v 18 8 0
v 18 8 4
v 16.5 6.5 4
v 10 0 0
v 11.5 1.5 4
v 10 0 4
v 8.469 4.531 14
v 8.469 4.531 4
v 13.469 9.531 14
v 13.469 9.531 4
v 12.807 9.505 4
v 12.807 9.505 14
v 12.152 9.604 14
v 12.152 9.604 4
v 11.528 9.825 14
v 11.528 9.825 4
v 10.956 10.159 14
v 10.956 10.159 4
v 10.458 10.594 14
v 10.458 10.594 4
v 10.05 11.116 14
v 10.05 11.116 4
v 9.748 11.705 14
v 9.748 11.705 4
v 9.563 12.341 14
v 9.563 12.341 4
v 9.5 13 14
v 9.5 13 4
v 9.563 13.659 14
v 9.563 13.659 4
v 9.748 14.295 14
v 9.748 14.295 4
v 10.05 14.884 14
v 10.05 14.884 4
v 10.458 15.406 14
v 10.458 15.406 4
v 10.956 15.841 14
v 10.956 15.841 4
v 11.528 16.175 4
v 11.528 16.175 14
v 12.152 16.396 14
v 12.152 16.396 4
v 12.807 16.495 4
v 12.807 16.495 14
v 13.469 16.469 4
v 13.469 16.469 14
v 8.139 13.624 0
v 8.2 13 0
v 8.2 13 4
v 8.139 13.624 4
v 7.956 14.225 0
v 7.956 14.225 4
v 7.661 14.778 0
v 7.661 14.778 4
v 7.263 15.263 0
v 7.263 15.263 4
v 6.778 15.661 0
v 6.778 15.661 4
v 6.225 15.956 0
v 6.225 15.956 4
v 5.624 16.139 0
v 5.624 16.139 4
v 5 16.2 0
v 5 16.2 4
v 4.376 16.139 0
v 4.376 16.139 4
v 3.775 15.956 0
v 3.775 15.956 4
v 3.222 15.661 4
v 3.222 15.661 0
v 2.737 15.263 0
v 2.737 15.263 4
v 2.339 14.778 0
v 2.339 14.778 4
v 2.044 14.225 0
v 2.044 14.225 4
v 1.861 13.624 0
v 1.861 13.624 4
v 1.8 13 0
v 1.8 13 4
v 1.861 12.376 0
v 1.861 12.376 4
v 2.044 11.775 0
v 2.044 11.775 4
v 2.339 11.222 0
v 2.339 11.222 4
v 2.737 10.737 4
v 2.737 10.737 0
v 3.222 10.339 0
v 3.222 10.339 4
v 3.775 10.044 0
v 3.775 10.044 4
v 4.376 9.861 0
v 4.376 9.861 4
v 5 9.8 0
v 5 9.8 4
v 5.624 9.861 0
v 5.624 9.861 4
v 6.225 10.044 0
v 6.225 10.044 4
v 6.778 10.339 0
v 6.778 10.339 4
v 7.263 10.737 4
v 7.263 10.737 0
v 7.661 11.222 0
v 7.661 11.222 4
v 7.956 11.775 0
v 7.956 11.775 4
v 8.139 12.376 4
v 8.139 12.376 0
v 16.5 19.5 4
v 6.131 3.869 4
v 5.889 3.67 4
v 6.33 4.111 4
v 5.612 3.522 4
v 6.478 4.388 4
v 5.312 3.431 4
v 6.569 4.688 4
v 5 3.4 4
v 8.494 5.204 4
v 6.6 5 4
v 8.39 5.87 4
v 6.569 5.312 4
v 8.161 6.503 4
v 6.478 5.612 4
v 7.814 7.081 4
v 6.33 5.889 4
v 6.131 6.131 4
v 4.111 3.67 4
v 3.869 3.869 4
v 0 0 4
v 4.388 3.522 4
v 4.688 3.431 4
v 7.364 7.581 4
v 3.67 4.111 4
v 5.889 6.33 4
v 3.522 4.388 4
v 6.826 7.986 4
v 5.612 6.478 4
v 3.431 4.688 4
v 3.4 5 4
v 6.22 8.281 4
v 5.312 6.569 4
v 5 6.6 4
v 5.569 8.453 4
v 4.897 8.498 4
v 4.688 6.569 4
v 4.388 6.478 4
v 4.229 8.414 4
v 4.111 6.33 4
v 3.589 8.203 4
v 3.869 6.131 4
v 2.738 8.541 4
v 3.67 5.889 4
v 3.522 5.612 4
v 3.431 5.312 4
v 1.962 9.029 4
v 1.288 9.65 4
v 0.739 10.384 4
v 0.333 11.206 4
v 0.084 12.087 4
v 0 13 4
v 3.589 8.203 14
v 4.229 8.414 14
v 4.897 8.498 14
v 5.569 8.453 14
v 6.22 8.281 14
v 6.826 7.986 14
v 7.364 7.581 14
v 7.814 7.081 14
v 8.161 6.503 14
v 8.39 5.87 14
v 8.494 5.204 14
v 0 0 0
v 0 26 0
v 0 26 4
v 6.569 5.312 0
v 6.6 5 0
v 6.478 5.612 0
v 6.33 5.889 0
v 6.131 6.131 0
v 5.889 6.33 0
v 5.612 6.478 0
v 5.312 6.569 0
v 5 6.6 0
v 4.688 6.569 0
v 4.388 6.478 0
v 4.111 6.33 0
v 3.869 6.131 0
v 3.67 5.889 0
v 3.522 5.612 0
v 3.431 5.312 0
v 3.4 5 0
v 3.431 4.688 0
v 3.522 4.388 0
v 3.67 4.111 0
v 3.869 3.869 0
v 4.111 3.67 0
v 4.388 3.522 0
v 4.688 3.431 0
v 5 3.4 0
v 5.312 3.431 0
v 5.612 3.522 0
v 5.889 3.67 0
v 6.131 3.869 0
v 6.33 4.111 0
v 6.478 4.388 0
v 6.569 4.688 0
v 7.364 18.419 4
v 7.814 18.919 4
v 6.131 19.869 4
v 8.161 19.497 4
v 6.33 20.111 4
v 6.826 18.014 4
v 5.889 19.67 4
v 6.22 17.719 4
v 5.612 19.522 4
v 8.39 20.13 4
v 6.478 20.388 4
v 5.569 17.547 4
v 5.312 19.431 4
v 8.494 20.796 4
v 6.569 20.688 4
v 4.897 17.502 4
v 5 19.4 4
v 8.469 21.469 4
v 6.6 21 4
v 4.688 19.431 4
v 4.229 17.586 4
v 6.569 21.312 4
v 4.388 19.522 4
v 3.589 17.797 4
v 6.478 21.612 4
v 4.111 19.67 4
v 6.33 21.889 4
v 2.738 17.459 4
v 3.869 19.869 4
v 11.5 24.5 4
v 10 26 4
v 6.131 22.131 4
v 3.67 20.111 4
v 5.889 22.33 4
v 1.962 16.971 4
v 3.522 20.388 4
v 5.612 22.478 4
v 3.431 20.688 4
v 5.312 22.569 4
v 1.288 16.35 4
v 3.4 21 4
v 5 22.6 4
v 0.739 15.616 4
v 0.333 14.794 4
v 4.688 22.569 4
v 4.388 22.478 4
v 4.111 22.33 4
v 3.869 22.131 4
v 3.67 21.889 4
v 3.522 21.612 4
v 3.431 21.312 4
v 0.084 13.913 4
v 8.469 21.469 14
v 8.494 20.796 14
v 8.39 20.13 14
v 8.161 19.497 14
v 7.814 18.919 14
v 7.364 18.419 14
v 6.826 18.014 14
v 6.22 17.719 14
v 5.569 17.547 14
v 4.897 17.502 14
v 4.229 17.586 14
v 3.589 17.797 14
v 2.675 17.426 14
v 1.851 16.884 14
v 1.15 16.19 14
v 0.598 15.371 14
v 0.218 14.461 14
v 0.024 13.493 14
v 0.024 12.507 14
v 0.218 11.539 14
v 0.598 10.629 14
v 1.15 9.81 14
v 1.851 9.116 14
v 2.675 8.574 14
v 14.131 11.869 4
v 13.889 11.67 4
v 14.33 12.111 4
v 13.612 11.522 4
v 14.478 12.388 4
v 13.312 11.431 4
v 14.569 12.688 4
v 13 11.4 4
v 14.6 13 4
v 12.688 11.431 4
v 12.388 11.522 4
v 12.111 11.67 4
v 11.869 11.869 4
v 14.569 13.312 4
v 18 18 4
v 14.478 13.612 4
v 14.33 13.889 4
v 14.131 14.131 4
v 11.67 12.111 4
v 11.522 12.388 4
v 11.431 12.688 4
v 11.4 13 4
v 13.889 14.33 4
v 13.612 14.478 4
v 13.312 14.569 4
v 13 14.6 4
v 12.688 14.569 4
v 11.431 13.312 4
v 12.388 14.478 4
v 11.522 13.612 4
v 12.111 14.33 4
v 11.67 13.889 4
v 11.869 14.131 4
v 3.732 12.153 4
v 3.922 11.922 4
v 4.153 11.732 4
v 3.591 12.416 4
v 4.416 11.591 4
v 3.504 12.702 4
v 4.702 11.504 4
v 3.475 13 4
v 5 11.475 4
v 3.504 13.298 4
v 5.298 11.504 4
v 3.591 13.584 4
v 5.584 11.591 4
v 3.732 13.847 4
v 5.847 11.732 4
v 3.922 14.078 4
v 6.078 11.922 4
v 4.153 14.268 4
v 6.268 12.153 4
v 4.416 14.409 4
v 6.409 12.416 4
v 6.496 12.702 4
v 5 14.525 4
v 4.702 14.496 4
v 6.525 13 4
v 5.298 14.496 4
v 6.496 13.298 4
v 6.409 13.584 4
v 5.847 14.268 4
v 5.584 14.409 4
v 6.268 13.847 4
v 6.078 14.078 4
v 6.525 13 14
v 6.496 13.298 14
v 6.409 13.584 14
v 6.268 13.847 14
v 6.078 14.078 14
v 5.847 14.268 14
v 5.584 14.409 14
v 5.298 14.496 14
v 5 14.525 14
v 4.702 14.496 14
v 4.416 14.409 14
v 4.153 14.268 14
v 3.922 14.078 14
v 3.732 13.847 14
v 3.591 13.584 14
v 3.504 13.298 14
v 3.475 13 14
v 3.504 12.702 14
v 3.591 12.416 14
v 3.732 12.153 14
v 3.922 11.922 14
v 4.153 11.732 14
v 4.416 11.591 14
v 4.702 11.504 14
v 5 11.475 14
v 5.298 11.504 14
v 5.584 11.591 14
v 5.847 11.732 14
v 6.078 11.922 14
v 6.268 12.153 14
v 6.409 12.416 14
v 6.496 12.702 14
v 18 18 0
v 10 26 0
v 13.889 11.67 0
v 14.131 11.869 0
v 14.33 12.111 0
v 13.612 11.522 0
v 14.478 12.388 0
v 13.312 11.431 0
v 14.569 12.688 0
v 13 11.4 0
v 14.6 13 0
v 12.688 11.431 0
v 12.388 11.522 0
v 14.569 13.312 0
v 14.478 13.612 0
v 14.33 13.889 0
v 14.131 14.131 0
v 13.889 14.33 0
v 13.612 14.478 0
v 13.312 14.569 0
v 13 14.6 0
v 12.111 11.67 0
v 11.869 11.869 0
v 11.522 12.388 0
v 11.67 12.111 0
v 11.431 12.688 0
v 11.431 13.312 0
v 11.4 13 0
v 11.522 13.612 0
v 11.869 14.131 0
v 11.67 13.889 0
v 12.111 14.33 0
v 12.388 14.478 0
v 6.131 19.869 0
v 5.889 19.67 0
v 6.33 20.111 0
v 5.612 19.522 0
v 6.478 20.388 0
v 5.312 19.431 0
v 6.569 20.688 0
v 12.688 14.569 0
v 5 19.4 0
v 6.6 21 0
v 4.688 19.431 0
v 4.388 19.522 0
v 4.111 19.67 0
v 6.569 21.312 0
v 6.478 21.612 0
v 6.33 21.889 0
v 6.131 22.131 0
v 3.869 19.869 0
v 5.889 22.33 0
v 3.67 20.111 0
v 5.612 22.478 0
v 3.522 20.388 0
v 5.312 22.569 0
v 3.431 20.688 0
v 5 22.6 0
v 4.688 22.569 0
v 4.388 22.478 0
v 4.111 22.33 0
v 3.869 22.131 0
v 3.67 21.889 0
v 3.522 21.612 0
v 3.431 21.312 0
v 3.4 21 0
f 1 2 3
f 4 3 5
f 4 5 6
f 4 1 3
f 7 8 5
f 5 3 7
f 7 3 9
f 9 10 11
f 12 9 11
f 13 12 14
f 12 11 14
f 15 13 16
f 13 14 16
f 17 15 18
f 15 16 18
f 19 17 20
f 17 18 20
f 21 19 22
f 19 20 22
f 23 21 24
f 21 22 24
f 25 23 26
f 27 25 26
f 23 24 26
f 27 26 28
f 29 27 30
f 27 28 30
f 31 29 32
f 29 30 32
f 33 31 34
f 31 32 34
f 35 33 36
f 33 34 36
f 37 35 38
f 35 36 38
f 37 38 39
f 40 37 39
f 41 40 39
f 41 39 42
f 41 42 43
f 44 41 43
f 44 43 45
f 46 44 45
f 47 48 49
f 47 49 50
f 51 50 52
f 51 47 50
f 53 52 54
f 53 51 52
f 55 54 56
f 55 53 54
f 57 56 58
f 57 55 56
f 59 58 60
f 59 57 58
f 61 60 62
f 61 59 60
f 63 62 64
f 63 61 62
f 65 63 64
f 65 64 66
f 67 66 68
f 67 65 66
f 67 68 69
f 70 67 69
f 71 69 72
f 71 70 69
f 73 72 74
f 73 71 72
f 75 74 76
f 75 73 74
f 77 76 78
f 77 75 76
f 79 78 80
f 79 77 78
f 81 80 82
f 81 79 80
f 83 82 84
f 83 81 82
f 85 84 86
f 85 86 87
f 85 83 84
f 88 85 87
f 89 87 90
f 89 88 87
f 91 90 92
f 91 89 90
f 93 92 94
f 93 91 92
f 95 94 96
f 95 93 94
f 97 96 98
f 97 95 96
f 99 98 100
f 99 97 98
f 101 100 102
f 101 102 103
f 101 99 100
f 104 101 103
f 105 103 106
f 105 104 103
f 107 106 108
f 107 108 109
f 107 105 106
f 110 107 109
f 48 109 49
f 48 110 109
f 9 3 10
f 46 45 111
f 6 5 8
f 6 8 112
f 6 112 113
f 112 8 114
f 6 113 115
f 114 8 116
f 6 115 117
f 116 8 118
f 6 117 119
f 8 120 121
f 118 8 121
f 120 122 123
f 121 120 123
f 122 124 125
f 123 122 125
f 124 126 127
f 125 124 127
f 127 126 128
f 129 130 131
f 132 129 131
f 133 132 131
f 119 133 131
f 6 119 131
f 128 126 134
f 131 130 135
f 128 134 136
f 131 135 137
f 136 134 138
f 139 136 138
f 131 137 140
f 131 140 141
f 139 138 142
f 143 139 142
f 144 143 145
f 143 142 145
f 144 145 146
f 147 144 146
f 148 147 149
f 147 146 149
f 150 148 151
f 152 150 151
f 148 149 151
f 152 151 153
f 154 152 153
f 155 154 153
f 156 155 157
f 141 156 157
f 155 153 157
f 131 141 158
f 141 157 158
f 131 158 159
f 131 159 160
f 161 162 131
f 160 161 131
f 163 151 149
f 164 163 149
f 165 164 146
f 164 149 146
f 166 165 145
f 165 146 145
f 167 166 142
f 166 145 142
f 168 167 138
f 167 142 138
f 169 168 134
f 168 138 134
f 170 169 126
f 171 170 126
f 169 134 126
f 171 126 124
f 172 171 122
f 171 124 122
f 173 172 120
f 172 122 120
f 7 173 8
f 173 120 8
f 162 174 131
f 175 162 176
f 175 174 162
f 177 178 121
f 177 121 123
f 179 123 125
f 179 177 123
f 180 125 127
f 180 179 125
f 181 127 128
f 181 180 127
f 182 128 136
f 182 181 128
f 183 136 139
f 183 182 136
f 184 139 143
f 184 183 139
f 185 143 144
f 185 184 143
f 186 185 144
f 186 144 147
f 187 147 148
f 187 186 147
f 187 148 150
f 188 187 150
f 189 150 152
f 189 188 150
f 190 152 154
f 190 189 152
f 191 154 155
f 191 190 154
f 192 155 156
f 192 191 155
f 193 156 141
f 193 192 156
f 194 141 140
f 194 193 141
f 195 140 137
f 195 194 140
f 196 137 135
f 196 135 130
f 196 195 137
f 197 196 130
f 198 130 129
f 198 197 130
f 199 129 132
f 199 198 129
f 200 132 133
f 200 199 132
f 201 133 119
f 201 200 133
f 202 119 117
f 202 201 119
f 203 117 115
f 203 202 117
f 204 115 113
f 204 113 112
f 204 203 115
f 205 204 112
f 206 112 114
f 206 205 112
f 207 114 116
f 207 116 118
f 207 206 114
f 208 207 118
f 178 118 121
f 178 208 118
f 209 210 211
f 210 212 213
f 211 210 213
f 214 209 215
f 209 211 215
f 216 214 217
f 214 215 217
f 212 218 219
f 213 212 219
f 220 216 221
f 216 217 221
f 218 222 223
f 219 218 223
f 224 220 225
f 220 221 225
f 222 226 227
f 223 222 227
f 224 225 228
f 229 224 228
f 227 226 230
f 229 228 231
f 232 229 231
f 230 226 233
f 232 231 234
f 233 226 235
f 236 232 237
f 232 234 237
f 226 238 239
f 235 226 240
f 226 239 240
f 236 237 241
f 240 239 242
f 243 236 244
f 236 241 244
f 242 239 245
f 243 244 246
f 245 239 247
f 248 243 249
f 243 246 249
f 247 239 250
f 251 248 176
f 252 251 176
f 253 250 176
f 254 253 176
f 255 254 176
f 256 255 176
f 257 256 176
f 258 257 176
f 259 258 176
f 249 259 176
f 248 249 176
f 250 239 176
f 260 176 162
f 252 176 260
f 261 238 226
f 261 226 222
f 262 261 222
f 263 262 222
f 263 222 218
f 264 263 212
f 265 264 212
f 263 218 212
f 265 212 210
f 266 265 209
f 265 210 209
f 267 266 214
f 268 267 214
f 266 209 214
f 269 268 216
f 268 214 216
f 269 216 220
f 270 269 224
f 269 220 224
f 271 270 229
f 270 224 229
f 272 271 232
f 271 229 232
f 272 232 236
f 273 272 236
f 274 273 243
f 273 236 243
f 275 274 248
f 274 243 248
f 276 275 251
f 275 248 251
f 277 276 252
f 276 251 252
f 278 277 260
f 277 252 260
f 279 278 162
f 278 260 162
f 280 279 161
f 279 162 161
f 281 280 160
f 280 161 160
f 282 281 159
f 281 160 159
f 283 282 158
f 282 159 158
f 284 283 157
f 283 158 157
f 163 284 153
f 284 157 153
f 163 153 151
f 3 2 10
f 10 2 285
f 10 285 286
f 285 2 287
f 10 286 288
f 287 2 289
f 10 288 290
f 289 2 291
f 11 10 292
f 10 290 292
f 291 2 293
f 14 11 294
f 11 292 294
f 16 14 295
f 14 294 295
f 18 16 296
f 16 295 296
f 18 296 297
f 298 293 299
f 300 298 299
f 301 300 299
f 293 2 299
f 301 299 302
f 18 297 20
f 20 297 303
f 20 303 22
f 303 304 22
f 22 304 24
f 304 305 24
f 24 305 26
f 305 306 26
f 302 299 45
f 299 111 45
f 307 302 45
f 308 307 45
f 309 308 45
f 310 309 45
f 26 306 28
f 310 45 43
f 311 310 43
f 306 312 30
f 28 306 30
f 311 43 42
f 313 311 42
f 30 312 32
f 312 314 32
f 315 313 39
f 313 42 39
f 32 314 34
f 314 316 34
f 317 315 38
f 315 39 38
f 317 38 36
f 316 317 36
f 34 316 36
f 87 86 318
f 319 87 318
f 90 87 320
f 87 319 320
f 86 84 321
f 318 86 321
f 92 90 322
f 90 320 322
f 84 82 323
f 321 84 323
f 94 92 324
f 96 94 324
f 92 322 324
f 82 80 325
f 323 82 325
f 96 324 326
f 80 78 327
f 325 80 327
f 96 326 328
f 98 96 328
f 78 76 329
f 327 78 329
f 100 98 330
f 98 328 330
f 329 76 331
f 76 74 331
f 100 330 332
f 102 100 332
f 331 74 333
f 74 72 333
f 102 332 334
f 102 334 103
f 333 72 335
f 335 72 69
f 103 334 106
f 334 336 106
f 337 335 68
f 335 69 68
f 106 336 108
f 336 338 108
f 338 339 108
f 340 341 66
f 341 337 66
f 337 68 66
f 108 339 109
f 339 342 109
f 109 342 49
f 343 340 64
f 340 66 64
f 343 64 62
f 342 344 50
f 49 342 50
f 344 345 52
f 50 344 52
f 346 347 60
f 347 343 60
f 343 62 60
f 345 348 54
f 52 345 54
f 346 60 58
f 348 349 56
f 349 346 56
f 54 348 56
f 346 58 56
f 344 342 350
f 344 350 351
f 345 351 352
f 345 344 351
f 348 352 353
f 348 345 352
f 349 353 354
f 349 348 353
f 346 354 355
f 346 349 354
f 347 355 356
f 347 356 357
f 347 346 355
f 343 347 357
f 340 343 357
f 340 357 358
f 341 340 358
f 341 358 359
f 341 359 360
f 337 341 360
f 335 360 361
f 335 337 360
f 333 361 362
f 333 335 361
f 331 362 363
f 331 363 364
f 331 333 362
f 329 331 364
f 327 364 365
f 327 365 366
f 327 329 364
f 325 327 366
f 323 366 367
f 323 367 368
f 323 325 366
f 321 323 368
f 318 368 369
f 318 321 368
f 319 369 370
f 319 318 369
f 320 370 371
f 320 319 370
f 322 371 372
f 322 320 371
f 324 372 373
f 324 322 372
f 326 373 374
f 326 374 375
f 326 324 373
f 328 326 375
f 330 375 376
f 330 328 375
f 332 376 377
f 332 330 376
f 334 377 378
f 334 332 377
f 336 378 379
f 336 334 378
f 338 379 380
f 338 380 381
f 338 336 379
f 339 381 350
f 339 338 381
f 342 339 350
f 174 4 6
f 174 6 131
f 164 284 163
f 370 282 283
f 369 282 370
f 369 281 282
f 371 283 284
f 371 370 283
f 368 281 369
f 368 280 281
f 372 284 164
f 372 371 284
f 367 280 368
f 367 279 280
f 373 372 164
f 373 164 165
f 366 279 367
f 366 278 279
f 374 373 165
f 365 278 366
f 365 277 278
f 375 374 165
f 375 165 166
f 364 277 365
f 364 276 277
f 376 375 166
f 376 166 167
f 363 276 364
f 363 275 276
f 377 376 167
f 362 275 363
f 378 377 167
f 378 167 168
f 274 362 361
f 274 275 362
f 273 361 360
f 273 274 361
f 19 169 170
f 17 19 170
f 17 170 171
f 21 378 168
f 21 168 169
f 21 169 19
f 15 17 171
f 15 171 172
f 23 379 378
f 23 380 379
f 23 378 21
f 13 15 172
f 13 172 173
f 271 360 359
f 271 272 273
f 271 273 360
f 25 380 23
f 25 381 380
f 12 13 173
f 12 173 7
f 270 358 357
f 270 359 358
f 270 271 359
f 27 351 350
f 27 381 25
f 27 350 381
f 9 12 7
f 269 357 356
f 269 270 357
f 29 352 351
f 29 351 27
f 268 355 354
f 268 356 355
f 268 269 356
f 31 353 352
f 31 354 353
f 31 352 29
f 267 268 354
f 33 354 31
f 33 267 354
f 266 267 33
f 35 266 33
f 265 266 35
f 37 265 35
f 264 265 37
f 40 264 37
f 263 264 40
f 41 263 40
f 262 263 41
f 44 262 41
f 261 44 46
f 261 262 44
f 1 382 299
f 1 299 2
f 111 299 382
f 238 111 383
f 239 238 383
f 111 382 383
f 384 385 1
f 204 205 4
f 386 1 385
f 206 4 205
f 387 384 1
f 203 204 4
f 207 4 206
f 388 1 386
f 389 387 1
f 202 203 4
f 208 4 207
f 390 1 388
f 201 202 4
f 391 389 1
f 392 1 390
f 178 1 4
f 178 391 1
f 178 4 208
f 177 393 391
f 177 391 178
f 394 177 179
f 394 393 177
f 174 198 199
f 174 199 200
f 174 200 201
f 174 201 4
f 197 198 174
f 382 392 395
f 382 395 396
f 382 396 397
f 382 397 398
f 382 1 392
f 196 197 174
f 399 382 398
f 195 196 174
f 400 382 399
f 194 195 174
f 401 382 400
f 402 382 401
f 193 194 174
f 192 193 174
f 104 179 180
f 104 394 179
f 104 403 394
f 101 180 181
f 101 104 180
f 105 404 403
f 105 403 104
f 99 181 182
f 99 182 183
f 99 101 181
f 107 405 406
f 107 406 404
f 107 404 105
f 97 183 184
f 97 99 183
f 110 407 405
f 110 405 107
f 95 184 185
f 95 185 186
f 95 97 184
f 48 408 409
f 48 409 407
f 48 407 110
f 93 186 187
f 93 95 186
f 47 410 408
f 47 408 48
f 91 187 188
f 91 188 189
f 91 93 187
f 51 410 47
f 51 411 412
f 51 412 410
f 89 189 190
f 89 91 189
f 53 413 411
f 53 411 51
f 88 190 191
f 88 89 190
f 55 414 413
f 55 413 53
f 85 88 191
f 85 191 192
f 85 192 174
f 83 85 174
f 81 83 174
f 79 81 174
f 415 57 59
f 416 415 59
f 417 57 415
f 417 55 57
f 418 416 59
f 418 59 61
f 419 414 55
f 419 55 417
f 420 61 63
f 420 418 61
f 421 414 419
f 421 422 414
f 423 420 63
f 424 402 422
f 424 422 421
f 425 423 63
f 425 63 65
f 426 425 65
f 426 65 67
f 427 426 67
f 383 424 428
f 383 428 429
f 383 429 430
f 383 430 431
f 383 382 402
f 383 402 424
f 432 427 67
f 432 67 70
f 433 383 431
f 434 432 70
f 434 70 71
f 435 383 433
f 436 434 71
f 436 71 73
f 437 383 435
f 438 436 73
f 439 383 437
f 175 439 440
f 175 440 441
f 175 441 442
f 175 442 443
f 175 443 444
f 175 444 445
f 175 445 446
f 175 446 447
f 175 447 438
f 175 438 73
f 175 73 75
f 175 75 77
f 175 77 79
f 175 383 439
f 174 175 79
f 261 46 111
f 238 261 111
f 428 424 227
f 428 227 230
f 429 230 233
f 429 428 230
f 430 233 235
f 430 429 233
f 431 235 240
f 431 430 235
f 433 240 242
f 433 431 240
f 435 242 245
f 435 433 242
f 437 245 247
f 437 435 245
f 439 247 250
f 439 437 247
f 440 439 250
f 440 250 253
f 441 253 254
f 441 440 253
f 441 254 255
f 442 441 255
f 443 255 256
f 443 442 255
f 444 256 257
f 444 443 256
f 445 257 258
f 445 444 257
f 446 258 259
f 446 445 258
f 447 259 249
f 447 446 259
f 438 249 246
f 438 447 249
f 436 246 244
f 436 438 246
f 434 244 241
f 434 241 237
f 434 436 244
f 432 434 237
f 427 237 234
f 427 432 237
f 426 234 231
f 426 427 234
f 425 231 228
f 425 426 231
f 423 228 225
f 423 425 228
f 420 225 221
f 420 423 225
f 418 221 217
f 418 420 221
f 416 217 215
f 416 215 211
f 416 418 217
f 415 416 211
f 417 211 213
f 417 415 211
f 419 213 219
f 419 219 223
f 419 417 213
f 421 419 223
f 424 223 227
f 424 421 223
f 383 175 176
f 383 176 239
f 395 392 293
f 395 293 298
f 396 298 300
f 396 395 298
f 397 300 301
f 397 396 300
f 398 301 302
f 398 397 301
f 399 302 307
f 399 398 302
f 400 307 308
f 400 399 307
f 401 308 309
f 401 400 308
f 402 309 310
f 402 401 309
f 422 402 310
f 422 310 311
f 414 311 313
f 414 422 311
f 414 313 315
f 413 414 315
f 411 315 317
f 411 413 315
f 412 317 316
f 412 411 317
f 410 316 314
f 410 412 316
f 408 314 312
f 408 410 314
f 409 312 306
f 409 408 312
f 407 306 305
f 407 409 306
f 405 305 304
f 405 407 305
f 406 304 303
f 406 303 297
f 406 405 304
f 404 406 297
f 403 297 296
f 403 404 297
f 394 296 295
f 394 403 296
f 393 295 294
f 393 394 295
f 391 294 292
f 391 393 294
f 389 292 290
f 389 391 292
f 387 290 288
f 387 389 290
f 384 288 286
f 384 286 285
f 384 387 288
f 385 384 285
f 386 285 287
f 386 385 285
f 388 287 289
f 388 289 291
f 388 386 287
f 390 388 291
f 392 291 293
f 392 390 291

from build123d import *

# Parameters (mm, degrees)
SKETCH_1_R          = 1.6
SKETCH_1_R_2        = 3.2
EXTRUDE_1_DEPTH     = 4
SKETCH_2_R          = 1.525
EXTRUDE_2_DEPTH     = 10
CUT_EXTRUDE_1_DEPTH = 10
CUT_EXTRUDE_2_DEPTH = 10


with BuildPart() as part:
    # 草图1 → 凸台-拉伸1 (new body)
    with BuildSketch(Plane.XY):
        Polygon((0, 0), (0, 26), (10, 26), (18, 18), (18, 8), (10, 0), align=None)
        with Locations((5, 21)):
            Circle(SKETCH_1_R, mode=Mode.SUBTRACT)
        with Locations((5, 13)):
            Circle(SKETCH_1_R_2, mode=Mode.SUBTRACT)
        with Locations((5, 5)):
            Circle(SKETCH_1_R, mode=Mode.SUBTRACT)
        with Locations((13, 13)):
            Circle(SKETCH_1_R, mode=Mode.SUBTRACT)
    extrude(amount=EXTRUDE_1_DEPTH)

    # 草图2 → 凸台-拉伸2 (add)
    with BuildSketch(Plane.XY.offset(4)):
        with BuildLine():
            Line((13.468501969, 16.468501969), (16.5, 19.5))
            Line((16.5, 19.5), (11.5, 24.5))
            Line((11.5, 24.5), (8.468501969, 21.468501969))
            ThreePointArc((8.468501969, 21.468501969), (7.104490226, 18.203373302), (3.589329863, 17.796875))
            ThreePointArc((3.589329863, 17.796875), (0, 13), (3.589329863, 8.203125))
            ThreePointArc((3.589329863, 8.203125), (7.104490226, 7.796626698), (8.468501969, 4.531498031))
            Line((8.468501969, 4.531498031), (11.5, 1.5))
            Line((11.5, 1.5), (16.5, 6.5))
            Line((16.5, 6.5), (13.468501969, 9.531498031))
            ThreePointArc((13.468501969, 9.531498031), (9.5, 13), (13.468501969, 16.468501969))
        make_face()
        with Locations((5, 13)):
            Circle(SKETCH_2_R, mode=Mode.SUBTRACT)
    extrude(amount=EXTRUDE_2_DEPTH)

    # 草图3 → 切除-拉伸1 (cut)
    with BuildSketch(Plane(origin=(-1.5, 1.5, 0), x_dir=(0, 0, -1), z_dir=(0.7071067811865477, -0.7071067811865475, 0))):
        Polygon((-4, 25.455844123), (-14, 25.455844123), (-14, 21.168658492), align=None)
    extrude(amount=-CUT_EXTRUDE_1_DEPTH, mode=Mode.SUBTRACT)

    # 草图4 → 切除-拉伸2 (cut)
    with BuildSketch(Plane(origin=(11.5, 11.5, 0), x_dir=(0, 0, -1), z_dir=(0.7071067811865474, 0.7071067811865477, 0))):
        Polygon((-4, -7.071067812), (-14, -2.783882181), (-14, -7.071067812), align=None)
    extrude(amount=-CUT_EXTRUDE_2_DEPTH, mode=Mode.SUBTRACT)


solid = part.part
